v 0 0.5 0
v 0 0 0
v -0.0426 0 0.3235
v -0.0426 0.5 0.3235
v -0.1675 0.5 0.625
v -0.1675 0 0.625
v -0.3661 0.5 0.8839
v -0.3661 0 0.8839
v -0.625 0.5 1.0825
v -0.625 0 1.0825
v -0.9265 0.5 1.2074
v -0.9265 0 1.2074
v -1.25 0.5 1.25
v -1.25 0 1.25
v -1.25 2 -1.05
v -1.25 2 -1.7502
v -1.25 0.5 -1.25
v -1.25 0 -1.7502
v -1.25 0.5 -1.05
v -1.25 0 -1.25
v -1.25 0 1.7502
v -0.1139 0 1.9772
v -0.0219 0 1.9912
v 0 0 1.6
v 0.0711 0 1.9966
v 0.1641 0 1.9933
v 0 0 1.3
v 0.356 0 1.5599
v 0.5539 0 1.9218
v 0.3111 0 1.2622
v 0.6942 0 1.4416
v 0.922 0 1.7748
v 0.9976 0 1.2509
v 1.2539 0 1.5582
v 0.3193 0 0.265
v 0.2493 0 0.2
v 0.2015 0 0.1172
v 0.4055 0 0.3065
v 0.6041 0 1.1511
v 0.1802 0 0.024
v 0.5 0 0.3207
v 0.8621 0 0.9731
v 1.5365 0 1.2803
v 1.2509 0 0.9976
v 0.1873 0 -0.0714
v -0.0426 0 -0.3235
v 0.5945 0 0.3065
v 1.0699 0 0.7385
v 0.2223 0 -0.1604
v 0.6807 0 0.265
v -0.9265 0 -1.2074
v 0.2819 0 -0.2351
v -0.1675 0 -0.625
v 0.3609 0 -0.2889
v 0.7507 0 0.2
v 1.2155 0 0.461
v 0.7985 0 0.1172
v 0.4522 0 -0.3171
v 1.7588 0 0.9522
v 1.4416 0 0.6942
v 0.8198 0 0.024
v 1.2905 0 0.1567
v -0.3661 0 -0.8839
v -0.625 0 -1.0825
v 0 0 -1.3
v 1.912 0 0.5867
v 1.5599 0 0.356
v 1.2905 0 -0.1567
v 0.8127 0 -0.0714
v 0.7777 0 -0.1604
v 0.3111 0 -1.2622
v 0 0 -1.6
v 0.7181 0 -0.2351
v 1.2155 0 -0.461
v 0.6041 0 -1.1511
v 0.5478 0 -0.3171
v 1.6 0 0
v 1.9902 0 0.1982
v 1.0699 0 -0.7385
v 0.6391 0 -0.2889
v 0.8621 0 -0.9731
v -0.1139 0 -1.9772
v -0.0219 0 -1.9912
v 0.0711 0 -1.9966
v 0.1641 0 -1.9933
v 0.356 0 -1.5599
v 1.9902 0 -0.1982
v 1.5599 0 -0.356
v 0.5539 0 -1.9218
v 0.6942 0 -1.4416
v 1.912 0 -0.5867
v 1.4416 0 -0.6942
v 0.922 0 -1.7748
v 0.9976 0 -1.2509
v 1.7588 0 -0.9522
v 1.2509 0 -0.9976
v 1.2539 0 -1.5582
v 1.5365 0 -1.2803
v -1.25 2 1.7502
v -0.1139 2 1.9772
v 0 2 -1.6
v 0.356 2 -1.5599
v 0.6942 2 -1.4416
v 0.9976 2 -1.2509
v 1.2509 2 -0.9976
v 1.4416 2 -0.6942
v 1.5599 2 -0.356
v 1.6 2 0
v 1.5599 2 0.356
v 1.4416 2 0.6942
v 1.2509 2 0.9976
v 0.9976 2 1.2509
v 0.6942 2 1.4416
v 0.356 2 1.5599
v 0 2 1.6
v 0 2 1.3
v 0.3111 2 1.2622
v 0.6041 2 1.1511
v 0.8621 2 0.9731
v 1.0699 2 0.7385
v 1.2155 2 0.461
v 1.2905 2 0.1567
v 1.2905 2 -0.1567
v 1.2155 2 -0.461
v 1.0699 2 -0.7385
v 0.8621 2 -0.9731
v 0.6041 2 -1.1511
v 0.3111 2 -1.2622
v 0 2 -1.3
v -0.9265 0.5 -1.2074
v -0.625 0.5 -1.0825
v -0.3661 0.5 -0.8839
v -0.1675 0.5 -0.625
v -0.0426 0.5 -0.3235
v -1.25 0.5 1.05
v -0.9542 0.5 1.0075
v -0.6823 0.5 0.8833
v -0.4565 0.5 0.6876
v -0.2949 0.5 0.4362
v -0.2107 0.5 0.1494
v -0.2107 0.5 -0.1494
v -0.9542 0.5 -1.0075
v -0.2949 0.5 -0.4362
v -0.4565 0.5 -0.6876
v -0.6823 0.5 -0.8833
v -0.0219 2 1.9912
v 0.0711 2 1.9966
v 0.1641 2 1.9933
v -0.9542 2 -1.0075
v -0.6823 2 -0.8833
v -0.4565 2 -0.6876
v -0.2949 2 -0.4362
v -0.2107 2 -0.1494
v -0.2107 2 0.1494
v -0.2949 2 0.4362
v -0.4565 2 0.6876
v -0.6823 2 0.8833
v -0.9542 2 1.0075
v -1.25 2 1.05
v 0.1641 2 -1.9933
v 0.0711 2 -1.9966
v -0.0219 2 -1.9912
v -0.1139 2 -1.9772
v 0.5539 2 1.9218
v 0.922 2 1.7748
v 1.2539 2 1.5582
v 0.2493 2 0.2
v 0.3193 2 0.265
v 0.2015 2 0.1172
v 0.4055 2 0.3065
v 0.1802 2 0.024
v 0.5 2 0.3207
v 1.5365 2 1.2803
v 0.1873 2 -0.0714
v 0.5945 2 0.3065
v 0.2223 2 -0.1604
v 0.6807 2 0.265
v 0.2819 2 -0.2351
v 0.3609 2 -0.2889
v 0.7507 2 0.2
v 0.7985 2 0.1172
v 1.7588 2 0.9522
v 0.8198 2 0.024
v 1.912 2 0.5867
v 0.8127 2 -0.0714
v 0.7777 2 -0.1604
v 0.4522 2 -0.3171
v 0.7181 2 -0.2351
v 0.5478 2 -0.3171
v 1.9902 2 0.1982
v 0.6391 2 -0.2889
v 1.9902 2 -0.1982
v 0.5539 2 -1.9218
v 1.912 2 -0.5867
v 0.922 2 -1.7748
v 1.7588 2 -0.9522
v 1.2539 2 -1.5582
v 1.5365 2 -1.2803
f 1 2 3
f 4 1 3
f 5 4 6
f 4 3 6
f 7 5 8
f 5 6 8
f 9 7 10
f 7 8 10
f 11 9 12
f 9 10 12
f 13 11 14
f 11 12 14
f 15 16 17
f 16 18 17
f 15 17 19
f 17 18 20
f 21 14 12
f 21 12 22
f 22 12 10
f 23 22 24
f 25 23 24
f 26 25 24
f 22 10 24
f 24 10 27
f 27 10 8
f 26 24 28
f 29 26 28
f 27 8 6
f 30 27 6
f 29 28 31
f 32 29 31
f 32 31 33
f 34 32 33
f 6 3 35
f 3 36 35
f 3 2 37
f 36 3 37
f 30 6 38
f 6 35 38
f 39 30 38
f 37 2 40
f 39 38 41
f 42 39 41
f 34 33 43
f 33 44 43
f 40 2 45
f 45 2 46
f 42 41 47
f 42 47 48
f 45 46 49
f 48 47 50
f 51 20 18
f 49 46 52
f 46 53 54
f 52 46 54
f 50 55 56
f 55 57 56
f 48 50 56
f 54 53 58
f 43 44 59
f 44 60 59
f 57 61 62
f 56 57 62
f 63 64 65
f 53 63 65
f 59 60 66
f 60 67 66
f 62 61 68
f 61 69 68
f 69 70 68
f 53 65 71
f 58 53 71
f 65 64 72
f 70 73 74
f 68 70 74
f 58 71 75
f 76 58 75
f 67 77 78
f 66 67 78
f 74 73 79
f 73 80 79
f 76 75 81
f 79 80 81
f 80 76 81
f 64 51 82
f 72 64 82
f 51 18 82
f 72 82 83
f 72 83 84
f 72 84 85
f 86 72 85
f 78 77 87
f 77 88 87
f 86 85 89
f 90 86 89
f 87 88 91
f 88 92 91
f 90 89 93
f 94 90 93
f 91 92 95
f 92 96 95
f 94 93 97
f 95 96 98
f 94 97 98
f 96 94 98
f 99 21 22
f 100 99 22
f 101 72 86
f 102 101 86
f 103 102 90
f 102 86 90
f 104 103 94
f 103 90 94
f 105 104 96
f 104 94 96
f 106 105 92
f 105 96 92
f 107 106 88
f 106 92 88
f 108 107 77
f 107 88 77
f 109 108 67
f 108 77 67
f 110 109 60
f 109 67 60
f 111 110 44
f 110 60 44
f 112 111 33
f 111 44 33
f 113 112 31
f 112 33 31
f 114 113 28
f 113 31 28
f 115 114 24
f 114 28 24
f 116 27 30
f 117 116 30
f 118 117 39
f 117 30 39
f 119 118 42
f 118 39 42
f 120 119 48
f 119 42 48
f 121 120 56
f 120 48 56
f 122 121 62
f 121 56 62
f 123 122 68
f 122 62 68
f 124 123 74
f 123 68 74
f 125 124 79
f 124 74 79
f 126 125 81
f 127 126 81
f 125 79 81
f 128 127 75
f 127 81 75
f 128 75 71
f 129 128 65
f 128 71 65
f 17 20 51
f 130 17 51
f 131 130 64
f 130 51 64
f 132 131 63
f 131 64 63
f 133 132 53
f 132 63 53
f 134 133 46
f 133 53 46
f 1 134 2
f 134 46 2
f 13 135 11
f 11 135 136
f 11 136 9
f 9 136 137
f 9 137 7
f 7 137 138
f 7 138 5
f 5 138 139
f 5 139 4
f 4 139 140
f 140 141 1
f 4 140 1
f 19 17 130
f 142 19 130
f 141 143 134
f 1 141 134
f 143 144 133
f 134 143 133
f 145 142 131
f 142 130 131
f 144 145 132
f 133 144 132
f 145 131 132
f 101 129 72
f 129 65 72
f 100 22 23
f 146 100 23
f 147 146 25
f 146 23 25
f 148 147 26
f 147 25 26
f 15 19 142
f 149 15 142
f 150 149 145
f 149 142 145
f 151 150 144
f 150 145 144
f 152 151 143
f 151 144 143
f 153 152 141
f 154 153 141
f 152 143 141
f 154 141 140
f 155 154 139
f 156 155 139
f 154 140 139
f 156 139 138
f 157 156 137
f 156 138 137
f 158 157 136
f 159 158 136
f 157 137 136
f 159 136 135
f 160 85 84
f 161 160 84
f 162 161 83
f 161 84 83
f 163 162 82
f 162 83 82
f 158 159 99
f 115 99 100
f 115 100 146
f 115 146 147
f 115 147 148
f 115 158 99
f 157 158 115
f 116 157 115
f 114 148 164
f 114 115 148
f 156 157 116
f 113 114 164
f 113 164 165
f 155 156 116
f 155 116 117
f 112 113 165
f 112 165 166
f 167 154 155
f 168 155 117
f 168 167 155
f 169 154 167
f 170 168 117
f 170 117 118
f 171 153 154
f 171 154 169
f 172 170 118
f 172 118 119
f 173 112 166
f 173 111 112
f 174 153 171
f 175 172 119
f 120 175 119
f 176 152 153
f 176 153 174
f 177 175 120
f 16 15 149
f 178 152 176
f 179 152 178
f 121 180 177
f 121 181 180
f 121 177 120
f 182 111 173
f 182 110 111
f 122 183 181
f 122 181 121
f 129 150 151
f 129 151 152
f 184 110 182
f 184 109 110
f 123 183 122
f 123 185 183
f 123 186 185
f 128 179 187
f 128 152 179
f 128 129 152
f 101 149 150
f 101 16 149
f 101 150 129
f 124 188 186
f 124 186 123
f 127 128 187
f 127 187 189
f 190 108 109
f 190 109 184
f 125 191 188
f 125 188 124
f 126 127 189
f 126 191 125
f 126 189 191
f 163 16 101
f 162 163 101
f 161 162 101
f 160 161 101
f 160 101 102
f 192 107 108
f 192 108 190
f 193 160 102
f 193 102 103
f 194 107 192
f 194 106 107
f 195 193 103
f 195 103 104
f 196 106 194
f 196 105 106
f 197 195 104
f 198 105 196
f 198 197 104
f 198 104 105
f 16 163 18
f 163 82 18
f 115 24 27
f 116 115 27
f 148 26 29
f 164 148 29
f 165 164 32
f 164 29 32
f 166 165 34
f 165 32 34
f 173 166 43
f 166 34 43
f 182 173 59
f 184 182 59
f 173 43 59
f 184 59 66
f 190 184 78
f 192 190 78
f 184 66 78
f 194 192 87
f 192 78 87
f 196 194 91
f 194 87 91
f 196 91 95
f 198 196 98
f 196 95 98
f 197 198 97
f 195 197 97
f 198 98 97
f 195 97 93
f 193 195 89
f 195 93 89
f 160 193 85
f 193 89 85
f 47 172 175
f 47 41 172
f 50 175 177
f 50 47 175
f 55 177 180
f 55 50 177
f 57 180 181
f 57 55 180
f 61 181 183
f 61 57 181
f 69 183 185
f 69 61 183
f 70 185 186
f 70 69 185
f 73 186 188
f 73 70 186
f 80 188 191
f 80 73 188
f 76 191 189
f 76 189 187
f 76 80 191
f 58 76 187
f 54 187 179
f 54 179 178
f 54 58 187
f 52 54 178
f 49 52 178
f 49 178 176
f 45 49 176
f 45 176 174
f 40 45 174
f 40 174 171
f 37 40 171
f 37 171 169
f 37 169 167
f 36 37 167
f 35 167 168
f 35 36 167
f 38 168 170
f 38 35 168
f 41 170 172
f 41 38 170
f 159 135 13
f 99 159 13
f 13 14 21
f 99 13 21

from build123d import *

# Parameters (mm, degrees)
SKETCH1_R           = 0.3207
BOSS_EXTRUDE1_DEPTH = 0.5
BOSS_EXTRUDE2_START = 0.5
SKETCH1_20_R        = 0.3207
BOSS_EXTRUDE2_DEPTH = 1.5


with BuildPart() as part:
    # Sketch1 → Boss-Extrude1 (new body)
    with BuildSketch(Plane(origin=(0, 0, 0), x_dir=(1, 0, 0), z_dir=(0, 1, 0))):
        with BuildLine():
            ThreePointArc((0.1641009, 1.993256355), (0.024548565, 1.994973575), (-0.113883759, 1.977245221))
            Line((-0.113883759, 1.977245221), (-1.25, 1.750241174))
            Line((-1.25, 1.750241174), (-1.25, 1.25))
            ThreePointArc((-1.25, 1.25), (-0.366116524, 0.883883476), (0, 0))
            ThreePointArc((0, 0), (-0.366116524, -0.883883476), (-1.25, -1.25))
            Line((-1.25, -1.25), (-1.25, -1.750241174))
            Line((-1.25, -1.750241174), (-0.11388376, -1.977245221))
            ThreePointArc((-0.11388376, -1.977245221), (0.024548564, -1.994973575), (0.164100898, -1.993256355))
            ThreePointArc((0.164100898, -1.993256355), (2, -1e-09), (0.1641009, 1.993256355))
        make_face()
        with Locations((0.5, 0)):
            Circle(SKETCH1_R, mode=Mode.SUBTRACT)
        with BuildLine():
            Line((0, 1.3), (0, 1.6))
            ThreePointArc((0, 1.6), (1.6, 0), (0, -1.6))
            Line((0, -1.6), (0, -1.3))
            ThreePointArc((0, -1.3), (1.3, 0), (0, 1.3))
        make_face(mode=Mode.SUBTRACT)
    extrude(amount=BOSS_EXTRUDE1_DEPTH)

    # Sketch1<20> → Boss-Extrude2 (add)
    with BuildSketch(Plane(origin=(0, 0, 0), x_dir=(1, 0, 0), z_dir=(0, 1, 0)).offset(BOSS_EXTRUDE2_START)):
        with BuildLine():
            ThreePointArc((0.1641009, 1.993256355), (0.024548565, 1.994973575), (-0.113883759, 1.977245221))
            Line((-0.113883759, 1.977245221), (-1.25, 1.750241174))
            Line((-1.25, 1.750241174), (-1.25, 1.05))
            ThreePointArc((-1.25, 1.05), (-0.2, 0), (-1.25, -1.05))
            Line((-1.25, -1.05), (-1.25, -1.750241174))
            Line((-1.25, -1.750241174), (-0.11388376, -1.977245221))
            ThreePointArc((-0.11388376, -1.977245221), (0.024548564, -1.994973575), (0.164100898, -1.993256355))
            ThreePointArc((0.164100898, -1.993256355), (2, -1e-09), (0.1641009, 1.993256355))
        make_face()
        with Locations((0.5, 0)):
            Circle(SKETCH1_20_R, mode=Mode.SUBTRACT)
        with BuildLine():
            Line((0, 1.3), (0, 1.6))
            ThreePointArc((0, 1.6), (1.6, 0), (0, -1.6))
            Line((0, -1.6), (0, -1.3))
            ThreePointArc((0, -1.3), (1.3, 0), (0, 1.3))
        make_face(mode=Mode.SUBTRACT)
    extrude(amount=BOSS_EXTRUDE2_DEPTH)


solid = part.part
